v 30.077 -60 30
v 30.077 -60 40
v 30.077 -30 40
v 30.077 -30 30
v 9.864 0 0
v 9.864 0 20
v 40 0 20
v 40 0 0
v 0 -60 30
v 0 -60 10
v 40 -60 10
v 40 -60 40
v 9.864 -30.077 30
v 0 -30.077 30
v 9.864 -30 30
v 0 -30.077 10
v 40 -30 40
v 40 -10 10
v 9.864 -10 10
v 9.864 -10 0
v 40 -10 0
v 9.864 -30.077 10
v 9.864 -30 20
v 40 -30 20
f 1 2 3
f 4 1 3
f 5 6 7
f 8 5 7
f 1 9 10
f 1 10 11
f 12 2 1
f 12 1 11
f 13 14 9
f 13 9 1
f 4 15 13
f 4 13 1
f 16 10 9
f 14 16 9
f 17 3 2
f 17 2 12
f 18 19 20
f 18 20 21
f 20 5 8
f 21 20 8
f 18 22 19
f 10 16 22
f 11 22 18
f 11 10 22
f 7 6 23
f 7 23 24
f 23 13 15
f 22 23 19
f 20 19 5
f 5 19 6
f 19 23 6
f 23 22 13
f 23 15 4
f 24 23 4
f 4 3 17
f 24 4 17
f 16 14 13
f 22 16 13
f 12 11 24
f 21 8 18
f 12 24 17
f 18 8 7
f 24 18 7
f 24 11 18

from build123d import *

# Parameters (mm, degrees)
F0_W      = 40
F0_H      = 40
F1_DEPTH  = 60
F2_W      = 10
F2_H      = 10
F3_DEPTH  = 50
F4_W      = 9.863964282
F4_H      = 30.0770029426
F5_DEPTH  = 20
F7_DEPTH  = 10
F8_DEPTH  = 30.001
F9_DEPTH  = 20.001
F10_W     = 30.136035718
F10_H     = 30
F11_DEPTH = 20
F12_DEPTH = 20


with BuildPart() as f1:
    # F0 (on Front) → F1 (new body)
    with BuildSketch(Plane.XZ):
        with Locations((20, 20)):
            Rectangle(F0_W, F0_H)
    extrude(amount=F1_DEPTH)

    # F2 (on face) → F3 (cut)
    with BuildSketch(Plane.XZ.offset(60)):
        with Locations((5, 5)):
            Rectangle(F2_W, F2_H)
    extrude(amount=-F3_DEPTH, mode=Mode.SUBTRACT)

    # F4 (on face) → F5 (cut)
    with BuildSketch(Plane.XY.offset(40)):
        with Locations((4.931982141, -15.0385014713)):
            Rectangle(F4_W, F4_H)
    extrude(amount=-F5_DEPTH, mode=Mode.SUBTRACT)

    # F6 (on face) → F7 (cut)
    with BuildSketch(Plane.XY.offset(40)):
        Polygon((0, -30.0770029426), (0, -60), (30.0770048052, -60), (30.0770048052, -30.0770029426), (9.863964282, -30.0770029426), align=None)
    extrude(amount=-F7_DEPTH, mode=Mode.SUBTRACT)

    # F8 (cut, through all): a face of the model
    f8_faces = [f1.faces().sort_by_distance(p)[0] for p in [
        (10, -35, 5),
    ]]
    extrude(f8_faces, amount=-F8_DEPTH, mode=Mode.SUBTRACT)

    # F9 (cut, through all): a face of the model
    f9_faces = [f1.faces().sort_by_distance(p)[0] for p in [
        (4.931982141, -15.0385014713, 20),
    ]]
    extrude(f9_faces, amount=-F9_DEPTH, mode=Mode.SUBTRACT)

    # F10 (on face) → F11 (cut)
    with BuildSketch(Plane.XY.offset(40)):
        with Locations((24.931982141, -15)):
            Rectangle(F10_W, F10_H)
    extrude(amount=-F11_DEPTH, mode=Mode.SUBTRACT)

    # F12 (cut): a face of the model
    f12_faces = [f1.faces().sort_by_distance(p)[0] for p in [
        (19.9704845436, -30.0770029426, 35),
    ]]
    extrude(f12_faces, amount=-F12_DEPTH, mode=Mode.SUBTRACT)


solid = f1.part
